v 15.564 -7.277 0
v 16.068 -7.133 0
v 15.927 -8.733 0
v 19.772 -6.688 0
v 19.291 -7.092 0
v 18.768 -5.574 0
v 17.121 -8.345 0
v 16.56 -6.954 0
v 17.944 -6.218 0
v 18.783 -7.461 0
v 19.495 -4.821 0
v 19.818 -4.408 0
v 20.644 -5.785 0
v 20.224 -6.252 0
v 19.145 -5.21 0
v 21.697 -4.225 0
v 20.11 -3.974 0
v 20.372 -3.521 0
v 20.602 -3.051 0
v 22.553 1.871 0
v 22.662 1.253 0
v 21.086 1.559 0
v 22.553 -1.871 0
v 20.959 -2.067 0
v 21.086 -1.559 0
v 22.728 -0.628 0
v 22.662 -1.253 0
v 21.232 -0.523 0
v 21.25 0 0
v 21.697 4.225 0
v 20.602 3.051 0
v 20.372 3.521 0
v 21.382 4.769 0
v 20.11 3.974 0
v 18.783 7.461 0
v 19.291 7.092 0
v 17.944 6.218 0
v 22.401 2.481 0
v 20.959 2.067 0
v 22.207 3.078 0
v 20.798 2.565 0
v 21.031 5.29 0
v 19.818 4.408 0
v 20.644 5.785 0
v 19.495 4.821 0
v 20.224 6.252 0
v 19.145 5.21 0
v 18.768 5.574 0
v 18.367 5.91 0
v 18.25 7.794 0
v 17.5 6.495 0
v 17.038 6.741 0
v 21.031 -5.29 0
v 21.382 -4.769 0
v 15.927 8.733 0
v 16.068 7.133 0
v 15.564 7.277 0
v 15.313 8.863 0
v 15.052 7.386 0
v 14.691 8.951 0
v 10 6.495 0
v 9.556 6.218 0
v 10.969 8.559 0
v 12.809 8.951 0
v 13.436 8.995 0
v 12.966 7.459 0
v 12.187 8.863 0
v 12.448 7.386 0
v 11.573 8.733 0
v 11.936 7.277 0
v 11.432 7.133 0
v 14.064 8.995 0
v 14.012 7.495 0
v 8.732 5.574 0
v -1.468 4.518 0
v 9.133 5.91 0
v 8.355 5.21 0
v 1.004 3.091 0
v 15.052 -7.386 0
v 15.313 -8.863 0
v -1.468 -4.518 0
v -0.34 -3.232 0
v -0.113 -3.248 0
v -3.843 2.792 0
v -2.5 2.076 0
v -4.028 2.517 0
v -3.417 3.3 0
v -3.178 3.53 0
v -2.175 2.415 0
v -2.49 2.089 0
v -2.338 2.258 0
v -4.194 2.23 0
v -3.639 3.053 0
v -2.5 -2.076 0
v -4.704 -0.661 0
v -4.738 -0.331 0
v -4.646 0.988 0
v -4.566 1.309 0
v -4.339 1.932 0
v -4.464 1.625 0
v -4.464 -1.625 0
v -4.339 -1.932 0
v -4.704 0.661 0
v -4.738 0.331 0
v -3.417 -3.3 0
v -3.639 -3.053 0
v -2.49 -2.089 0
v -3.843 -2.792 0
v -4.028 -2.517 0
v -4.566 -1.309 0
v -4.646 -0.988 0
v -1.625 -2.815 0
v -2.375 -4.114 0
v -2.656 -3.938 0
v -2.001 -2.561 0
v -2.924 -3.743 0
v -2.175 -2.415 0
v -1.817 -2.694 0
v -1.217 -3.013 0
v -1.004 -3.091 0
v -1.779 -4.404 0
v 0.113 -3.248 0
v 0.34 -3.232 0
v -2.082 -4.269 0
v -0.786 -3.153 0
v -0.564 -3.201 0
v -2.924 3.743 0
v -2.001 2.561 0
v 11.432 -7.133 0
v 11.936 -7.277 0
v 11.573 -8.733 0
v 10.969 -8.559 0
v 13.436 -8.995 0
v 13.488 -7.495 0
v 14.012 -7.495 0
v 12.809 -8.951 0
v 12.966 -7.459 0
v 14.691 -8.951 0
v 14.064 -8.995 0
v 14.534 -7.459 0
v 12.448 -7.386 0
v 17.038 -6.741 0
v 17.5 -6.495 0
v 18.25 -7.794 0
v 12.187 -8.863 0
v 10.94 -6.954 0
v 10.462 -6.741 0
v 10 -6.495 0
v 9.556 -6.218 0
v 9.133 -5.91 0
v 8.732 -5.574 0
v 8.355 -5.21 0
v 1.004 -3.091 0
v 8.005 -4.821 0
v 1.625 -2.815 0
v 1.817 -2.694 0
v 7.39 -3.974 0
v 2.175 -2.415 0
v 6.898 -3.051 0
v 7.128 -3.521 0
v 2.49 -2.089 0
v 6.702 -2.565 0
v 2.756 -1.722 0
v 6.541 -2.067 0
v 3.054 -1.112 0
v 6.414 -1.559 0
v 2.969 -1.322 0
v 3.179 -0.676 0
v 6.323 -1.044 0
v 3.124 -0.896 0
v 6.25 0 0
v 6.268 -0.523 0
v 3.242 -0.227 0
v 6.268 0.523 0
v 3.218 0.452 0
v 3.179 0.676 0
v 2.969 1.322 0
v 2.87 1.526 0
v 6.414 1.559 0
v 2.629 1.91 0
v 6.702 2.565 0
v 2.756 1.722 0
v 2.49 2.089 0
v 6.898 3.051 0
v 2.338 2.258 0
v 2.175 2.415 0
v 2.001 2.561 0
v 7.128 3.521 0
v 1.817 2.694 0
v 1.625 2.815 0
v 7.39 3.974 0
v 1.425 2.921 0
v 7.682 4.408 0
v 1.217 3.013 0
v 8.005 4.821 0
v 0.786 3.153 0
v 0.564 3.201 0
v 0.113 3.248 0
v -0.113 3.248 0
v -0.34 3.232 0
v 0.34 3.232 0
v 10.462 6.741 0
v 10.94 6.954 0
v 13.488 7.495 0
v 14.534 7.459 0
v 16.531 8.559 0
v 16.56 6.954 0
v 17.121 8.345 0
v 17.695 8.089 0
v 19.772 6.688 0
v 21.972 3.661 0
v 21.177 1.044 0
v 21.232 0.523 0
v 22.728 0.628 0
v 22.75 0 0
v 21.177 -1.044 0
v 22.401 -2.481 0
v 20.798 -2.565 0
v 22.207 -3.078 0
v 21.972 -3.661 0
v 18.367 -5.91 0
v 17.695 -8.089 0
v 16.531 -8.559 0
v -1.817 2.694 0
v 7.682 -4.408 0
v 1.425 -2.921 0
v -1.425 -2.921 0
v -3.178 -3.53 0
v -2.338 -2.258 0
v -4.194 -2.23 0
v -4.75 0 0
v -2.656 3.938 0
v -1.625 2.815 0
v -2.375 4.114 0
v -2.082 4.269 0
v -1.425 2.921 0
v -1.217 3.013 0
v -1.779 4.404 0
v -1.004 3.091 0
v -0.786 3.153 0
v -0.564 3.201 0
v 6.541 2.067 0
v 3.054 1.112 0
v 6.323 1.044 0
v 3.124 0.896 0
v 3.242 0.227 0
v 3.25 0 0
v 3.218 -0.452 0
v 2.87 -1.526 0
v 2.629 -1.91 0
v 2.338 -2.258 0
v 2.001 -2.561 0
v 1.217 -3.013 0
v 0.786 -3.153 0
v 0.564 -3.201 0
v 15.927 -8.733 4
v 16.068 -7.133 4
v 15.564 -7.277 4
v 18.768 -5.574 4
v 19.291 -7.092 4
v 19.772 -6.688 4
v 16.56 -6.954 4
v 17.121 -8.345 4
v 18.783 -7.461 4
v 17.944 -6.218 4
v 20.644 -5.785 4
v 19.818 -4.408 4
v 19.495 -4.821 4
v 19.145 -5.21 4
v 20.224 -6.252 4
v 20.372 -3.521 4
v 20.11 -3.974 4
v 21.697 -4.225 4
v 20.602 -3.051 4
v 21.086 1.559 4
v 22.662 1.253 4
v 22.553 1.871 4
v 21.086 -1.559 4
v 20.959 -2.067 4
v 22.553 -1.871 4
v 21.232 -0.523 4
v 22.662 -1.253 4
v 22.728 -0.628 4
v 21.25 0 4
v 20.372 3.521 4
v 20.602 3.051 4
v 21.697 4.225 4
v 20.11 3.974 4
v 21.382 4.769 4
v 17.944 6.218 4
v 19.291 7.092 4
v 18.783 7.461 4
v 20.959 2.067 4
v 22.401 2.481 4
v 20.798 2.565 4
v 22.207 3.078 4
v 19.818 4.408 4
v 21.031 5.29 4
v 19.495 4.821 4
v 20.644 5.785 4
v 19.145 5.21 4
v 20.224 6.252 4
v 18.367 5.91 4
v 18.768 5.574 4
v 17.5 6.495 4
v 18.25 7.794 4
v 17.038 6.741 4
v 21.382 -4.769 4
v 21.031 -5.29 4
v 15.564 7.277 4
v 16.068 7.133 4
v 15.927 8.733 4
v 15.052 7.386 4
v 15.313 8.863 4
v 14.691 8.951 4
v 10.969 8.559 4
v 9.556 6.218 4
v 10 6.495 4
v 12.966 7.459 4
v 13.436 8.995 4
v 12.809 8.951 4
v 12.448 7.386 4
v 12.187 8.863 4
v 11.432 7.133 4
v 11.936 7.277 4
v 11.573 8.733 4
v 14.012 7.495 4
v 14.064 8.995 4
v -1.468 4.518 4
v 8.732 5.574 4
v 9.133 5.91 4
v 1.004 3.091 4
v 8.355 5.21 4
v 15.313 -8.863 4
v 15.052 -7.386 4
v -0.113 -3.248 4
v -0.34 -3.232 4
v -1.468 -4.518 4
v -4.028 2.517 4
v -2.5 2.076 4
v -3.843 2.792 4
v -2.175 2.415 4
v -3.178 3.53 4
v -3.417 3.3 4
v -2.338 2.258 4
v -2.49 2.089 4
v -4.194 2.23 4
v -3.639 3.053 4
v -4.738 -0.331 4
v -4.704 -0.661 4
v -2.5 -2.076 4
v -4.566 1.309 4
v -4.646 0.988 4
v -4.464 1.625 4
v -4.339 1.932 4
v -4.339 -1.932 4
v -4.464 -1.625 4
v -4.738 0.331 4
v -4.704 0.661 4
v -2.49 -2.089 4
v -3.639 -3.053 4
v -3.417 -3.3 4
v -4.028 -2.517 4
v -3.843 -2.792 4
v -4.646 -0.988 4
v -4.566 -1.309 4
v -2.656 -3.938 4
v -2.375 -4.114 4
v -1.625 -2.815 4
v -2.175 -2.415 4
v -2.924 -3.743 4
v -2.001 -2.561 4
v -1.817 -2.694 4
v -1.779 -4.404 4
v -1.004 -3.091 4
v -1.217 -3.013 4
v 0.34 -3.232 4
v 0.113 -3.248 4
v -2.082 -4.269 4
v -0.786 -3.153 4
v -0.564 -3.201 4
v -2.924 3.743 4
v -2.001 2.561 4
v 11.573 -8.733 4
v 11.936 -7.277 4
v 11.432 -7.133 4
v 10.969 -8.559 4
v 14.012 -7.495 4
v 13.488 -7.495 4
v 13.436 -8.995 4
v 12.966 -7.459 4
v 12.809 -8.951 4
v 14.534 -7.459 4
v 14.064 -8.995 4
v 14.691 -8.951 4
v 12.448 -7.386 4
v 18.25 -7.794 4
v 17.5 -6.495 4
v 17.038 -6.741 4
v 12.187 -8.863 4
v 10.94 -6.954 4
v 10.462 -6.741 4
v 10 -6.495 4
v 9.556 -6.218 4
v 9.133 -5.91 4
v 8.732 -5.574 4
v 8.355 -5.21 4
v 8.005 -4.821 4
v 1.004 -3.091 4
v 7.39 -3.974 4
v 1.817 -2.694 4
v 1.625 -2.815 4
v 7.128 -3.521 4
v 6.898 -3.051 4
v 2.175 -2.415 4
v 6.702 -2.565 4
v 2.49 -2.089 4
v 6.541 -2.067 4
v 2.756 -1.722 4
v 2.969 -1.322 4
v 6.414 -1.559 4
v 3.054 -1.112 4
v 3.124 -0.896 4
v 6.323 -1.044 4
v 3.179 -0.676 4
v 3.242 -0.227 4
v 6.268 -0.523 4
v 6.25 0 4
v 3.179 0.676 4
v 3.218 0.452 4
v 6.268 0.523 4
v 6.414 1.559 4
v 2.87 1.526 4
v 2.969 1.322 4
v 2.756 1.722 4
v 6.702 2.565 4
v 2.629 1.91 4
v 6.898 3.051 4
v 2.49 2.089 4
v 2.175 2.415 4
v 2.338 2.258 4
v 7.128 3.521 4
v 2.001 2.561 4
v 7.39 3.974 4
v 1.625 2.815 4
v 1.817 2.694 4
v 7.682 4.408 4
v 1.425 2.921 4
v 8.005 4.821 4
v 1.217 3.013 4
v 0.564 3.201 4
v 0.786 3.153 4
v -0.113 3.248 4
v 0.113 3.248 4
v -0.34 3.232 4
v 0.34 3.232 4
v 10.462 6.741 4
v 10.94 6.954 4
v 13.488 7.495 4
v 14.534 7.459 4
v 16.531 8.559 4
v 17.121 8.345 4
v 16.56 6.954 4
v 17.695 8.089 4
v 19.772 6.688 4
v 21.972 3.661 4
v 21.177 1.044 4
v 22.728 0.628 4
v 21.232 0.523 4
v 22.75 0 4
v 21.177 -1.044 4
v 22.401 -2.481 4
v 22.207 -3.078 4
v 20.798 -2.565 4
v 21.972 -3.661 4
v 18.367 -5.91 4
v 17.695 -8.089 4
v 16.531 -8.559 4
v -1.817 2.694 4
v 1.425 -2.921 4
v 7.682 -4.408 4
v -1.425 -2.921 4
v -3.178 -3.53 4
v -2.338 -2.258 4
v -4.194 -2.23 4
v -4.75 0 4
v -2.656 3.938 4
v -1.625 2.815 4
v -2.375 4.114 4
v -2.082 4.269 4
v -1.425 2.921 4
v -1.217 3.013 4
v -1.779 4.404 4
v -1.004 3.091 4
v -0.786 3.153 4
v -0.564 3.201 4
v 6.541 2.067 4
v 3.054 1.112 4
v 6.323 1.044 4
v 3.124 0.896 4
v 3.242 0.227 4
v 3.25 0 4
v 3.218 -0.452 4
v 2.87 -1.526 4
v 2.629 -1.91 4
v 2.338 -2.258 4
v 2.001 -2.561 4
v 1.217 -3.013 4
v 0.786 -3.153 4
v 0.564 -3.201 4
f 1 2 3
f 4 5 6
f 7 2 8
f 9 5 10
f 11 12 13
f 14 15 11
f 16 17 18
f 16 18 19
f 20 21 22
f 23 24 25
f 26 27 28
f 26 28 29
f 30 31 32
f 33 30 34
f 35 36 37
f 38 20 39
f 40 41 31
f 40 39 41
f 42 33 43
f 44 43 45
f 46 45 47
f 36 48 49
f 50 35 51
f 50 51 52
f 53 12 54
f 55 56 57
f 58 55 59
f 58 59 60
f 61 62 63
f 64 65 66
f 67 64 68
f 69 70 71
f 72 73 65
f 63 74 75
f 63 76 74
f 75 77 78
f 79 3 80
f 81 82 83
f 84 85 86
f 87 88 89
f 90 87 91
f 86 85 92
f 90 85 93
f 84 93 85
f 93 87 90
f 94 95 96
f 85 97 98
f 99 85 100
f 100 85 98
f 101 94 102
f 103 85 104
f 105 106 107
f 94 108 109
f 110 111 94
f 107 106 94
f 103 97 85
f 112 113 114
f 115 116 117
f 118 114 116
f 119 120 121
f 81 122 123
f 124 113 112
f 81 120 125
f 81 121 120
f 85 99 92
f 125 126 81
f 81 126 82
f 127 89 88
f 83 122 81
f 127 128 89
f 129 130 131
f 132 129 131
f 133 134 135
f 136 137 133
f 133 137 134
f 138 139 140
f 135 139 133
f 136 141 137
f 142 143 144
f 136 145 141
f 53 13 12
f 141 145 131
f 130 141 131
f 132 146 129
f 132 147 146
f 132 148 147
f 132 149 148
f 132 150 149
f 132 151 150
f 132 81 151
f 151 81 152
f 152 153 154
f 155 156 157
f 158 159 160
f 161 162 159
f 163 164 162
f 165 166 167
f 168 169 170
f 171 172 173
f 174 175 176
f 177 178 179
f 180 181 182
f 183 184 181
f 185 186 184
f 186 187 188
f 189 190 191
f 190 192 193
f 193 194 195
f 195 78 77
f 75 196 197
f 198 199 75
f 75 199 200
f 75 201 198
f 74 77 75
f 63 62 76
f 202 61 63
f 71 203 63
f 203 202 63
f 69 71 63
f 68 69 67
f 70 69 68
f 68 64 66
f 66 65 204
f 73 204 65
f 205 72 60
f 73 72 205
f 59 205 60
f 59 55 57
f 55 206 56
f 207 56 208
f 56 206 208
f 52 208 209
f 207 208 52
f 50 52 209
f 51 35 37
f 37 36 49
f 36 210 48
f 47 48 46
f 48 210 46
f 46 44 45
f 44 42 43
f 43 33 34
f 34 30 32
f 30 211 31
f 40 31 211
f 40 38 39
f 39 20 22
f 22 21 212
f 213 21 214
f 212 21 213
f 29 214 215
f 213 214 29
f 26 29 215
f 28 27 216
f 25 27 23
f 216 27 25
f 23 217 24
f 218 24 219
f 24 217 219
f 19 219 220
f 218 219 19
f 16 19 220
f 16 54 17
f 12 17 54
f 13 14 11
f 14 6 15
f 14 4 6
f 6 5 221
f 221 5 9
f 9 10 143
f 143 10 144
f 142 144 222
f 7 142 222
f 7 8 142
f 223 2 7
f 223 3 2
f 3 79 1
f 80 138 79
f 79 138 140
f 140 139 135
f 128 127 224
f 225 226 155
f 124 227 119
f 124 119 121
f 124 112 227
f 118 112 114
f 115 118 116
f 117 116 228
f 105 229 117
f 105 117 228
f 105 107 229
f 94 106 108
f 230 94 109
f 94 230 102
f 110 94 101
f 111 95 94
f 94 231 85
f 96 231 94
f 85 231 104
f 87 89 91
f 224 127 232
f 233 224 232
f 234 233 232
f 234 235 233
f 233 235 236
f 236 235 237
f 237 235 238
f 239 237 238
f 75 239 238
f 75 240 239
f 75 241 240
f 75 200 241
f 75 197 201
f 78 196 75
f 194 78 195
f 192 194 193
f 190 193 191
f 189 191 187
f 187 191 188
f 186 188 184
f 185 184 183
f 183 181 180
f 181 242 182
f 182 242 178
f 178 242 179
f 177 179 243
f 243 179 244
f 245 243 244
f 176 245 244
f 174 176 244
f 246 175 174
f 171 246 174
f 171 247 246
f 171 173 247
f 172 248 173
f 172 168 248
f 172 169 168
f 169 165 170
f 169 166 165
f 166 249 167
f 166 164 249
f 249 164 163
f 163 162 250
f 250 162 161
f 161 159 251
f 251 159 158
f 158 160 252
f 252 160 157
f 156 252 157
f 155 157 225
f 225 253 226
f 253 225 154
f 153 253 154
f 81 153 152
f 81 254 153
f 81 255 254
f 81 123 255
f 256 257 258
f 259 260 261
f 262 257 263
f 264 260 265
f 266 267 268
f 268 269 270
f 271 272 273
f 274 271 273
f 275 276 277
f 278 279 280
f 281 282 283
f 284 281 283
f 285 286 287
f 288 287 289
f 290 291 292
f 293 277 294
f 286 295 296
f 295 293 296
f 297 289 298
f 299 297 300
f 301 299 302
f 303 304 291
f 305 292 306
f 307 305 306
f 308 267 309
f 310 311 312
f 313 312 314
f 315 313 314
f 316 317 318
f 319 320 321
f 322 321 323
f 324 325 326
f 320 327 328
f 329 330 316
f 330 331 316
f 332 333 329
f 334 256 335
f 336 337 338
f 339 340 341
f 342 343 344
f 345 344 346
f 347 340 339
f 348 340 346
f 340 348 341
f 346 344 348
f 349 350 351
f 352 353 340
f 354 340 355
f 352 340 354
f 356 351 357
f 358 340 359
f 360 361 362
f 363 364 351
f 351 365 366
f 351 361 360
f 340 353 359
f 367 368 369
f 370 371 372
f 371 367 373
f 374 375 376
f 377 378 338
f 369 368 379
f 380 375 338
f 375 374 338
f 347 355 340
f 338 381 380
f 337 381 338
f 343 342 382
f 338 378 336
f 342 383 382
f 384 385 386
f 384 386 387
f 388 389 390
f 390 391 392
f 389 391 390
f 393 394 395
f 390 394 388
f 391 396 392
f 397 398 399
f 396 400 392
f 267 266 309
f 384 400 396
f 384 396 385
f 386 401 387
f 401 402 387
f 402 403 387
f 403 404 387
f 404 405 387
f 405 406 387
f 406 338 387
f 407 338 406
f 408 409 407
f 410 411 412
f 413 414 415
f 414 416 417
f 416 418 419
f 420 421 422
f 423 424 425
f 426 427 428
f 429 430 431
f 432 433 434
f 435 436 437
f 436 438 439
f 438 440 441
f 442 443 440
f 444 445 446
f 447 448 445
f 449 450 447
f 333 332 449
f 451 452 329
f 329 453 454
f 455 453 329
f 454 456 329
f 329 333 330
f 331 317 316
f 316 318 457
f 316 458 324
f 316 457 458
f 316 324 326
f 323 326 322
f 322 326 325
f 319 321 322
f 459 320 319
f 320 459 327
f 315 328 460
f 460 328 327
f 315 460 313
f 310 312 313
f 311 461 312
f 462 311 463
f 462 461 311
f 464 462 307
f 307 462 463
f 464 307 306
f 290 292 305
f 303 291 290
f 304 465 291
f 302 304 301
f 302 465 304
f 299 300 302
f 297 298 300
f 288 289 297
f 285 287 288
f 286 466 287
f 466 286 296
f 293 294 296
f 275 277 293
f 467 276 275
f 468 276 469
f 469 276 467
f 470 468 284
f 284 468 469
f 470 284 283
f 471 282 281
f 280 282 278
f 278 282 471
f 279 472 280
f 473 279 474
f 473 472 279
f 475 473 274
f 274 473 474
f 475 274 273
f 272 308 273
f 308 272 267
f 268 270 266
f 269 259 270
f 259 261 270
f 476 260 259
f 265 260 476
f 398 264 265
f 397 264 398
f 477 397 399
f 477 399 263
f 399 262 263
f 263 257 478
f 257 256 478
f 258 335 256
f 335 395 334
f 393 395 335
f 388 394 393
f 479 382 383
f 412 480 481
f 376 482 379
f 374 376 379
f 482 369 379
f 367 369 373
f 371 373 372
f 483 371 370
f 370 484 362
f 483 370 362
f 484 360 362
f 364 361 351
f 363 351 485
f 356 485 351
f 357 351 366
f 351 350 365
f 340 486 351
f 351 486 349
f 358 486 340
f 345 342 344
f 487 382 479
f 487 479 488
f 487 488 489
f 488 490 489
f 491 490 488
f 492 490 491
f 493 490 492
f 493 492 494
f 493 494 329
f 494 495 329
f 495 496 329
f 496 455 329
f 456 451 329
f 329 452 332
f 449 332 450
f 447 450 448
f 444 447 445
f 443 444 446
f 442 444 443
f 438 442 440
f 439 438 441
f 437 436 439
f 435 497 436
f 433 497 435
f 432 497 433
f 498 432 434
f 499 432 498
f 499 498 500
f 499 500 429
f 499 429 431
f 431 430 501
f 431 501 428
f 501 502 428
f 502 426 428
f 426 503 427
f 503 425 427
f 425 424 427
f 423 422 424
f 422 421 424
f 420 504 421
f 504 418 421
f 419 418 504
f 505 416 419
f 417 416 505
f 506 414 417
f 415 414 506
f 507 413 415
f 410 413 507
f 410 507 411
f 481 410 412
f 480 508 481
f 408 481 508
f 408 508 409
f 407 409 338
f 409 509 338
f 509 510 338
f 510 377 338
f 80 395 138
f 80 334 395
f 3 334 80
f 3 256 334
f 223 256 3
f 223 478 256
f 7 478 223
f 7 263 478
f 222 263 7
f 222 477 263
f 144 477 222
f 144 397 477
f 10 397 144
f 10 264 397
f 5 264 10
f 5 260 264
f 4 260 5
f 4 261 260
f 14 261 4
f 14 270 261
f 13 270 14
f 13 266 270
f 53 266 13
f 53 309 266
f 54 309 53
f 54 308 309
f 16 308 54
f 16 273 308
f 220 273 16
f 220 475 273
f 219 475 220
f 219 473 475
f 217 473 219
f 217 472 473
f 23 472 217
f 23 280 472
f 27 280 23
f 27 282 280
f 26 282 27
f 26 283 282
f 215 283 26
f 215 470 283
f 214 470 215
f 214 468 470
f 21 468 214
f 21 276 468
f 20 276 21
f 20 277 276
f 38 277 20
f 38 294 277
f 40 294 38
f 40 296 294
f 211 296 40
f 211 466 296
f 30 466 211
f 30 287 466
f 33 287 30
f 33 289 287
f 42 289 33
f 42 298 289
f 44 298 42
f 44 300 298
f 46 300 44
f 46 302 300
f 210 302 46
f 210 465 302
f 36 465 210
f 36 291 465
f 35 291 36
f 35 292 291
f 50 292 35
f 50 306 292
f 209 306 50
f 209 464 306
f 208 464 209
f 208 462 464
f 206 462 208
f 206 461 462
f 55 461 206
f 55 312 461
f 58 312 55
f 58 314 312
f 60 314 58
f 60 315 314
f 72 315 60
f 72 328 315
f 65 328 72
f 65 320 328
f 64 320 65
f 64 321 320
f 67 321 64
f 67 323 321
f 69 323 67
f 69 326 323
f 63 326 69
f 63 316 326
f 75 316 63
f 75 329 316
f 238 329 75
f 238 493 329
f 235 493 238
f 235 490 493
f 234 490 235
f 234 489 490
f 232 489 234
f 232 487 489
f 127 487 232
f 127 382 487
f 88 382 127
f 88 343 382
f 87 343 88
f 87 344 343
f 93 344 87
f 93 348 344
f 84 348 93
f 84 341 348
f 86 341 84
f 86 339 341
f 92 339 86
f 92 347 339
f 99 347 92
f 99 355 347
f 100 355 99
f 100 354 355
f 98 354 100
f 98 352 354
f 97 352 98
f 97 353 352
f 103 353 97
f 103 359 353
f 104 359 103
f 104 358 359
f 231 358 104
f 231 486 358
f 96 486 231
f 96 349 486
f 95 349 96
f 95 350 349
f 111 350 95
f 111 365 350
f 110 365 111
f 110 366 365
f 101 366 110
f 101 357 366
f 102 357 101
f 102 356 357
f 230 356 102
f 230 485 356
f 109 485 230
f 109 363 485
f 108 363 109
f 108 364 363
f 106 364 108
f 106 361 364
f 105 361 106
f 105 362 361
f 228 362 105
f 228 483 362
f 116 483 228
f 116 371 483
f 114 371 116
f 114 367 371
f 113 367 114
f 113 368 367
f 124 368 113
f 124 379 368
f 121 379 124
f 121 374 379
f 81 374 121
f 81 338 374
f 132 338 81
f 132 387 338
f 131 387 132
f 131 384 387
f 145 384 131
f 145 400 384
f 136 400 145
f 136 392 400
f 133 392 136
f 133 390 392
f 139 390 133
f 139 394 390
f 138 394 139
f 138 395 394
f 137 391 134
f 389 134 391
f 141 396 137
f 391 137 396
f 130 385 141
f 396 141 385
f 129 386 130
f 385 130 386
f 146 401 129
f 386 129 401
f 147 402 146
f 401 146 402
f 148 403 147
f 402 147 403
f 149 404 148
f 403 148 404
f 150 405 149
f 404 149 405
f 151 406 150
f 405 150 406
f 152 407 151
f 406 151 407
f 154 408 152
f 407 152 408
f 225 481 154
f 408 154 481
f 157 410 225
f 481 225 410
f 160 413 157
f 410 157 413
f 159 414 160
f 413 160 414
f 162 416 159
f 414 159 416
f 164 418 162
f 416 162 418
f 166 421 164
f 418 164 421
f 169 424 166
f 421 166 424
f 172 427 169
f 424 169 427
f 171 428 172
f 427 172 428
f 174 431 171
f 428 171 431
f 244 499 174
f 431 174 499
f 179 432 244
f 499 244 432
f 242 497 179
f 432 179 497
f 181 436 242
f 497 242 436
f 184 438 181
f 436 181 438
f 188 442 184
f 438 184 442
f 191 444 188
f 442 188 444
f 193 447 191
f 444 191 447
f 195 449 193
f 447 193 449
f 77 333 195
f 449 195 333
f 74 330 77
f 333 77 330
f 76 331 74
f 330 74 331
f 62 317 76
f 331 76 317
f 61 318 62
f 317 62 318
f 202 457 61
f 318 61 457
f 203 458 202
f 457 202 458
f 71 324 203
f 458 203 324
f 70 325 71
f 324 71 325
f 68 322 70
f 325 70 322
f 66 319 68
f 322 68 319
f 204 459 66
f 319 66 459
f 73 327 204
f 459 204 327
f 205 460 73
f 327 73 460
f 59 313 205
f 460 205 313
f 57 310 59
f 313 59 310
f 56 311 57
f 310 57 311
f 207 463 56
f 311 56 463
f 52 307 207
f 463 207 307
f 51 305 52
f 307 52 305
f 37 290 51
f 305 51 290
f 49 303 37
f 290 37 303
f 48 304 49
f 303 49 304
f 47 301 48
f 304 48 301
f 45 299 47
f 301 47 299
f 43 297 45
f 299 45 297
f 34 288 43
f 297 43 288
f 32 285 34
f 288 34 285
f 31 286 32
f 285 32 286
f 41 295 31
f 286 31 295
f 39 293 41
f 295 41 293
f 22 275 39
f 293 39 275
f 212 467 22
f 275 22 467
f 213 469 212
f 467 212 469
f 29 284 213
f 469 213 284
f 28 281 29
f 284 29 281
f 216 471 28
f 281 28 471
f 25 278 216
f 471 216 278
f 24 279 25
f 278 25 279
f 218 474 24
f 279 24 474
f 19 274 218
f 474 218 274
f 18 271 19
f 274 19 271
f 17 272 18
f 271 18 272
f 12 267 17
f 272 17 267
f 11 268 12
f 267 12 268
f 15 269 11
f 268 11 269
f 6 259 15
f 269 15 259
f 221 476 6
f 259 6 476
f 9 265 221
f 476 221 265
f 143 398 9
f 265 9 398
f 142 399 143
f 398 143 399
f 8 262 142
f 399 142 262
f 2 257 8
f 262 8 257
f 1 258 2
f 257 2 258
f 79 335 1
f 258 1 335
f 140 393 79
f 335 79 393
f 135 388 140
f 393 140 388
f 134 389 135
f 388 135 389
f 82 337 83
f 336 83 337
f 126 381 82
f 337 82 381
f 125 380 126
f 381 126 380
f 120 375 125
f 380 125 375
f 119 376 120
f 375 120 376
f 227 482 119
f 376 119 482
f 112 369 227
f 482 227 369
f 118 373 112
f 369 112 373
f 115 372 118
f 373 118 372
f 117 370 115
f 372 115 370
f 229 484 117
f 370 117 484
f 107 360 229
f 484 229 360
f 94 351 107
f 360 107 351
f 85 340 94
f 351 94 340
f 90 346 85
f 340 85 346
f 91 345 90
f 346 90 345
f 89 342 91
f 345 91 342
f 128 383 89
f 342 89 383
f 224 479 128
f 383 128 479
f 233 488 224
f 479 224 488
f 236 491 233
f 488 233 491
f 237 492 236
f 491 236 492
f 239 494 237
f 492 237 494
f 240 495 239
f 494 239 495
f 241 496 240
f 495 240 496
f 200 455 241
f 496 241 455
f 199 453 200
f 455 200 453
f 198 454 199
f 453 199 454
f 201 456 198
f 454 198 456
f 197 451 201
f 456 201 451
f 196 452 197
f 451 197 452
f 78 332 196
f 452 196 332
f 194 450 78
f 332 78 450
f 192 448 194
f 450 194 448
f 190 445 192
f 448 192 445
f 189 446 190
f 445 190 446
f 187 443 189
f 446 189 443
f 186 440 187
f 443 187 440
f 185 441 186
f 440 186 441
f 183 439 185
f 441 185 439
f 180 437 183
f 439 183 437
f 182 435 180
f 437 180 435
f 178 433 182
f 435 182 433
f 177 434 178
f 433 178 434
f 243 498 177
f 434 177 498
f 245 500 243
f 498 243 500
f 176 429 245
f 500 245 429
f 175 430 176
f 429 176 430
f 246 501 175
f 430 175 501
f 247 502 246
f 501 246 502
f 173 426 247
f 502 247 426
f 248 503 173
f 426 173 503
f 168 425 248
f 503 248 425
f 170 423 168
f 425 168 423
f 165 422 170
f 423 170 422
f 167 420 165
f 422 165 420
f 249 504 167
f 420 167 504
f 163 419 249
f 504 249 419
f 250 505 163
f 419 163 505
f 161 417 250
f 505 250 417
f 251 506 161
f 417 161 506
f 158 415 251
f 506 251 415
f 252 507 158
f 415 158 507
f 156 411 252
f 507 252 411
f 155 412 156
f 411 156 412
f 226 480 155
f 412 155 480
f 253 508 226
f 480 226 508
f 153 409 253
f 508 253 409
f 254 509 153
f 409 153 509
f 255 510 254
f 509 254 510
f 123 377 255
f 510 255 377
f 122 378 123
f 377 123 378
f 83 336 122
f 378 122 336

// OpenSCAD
/*

 small part for a VO&S Spinnewiel:
 it's an eyelet to slide along the flight to
 direct the spun yarn on the bobbin.
 You need 2, and a bushing.

 You probably want to balance the flight with a few
 M8 washers and keep them in their place with an eyelet
 and a bushing (see spinnewiel_vos_klem.scad)

 the 2 modules, outline() and punchout()
 describe the outline of the part and the holes
 to be punched out.

 Punchout is then subtracted from outline and the result
 is given thickness.
*/

$fn=90;

// flight is 6.5mm with a .5mm flat edge ground
// on one side. It keeps the eyelet straight
flight_dia=6.5;
flight_flat=.5;

thickness=4;

// bus goes over flight
bus_thickness=3;
bus_id=flight_dia;
bus_od=bus_id+bus_thickness;

// define eye for the yarn
// same as the the bus, but you can change it
ring_thickness=bus_thickness;
ring_id=15;
ring_od=ring_id+ring_thickness;

// center 2 center is used so much it's
// earned its own variable
c2c = (bus_od+ring_od)/2;

// create the eyelet: lay down the outline, punch a few holes
// and extrude it a bit
linear_extrude(height=thickness, center=false, convexity=10) {
    difference() {
        outline();
        punchout();
    }
}

module punchout() {
    intersection() {
        circle(d=flight_dia);
        // the flight has a flat side to register
        translate([flight_flat,0])
            square(
                [flight_dia-flight_flat,flight_dia],
                center=true);
    }
    // ring for the yarn
    translate([c2c,0])
        circle(d=ring_id);
}

module outline() {
    hull() {
        circle(d=bus_od);
        translate([c2c,0])
        circle(d=ring_od);
    }
}


// old module to create an outline around the
// two circles.
// Before I found out about 'hull()' :-/
module _outline() {
    circle(d=bus_od);
    translate([c2c,0])
        circle(d=ring_od);

    // create a nice filler between the
    // 2 circles
    //
    // adapted from
    // https://unixwars.blogspot.com/2016/03/joining-two-circlescylinders-in.html
    r1 = bus_od/2;
    r2 = ring_od/2;

    alpha = asin((r2-r1)/(c2c));
    x1 = r1*sin(alpha);
    y1 = r1*cos(alpha);
    x2 = c2c-r2*sin(alpha);
    y2 = r2*cos(alpha);

    point0 = [-x1,-y1];
    point1 = [-x1,y1];
    point2 = [x2,y2];
    point3 = [x2,-y2];
    
    polygon(
        points=[
            point0,
            point1,
            point2,
            point3],
        paths=[[0,1,2,3]]);
}
